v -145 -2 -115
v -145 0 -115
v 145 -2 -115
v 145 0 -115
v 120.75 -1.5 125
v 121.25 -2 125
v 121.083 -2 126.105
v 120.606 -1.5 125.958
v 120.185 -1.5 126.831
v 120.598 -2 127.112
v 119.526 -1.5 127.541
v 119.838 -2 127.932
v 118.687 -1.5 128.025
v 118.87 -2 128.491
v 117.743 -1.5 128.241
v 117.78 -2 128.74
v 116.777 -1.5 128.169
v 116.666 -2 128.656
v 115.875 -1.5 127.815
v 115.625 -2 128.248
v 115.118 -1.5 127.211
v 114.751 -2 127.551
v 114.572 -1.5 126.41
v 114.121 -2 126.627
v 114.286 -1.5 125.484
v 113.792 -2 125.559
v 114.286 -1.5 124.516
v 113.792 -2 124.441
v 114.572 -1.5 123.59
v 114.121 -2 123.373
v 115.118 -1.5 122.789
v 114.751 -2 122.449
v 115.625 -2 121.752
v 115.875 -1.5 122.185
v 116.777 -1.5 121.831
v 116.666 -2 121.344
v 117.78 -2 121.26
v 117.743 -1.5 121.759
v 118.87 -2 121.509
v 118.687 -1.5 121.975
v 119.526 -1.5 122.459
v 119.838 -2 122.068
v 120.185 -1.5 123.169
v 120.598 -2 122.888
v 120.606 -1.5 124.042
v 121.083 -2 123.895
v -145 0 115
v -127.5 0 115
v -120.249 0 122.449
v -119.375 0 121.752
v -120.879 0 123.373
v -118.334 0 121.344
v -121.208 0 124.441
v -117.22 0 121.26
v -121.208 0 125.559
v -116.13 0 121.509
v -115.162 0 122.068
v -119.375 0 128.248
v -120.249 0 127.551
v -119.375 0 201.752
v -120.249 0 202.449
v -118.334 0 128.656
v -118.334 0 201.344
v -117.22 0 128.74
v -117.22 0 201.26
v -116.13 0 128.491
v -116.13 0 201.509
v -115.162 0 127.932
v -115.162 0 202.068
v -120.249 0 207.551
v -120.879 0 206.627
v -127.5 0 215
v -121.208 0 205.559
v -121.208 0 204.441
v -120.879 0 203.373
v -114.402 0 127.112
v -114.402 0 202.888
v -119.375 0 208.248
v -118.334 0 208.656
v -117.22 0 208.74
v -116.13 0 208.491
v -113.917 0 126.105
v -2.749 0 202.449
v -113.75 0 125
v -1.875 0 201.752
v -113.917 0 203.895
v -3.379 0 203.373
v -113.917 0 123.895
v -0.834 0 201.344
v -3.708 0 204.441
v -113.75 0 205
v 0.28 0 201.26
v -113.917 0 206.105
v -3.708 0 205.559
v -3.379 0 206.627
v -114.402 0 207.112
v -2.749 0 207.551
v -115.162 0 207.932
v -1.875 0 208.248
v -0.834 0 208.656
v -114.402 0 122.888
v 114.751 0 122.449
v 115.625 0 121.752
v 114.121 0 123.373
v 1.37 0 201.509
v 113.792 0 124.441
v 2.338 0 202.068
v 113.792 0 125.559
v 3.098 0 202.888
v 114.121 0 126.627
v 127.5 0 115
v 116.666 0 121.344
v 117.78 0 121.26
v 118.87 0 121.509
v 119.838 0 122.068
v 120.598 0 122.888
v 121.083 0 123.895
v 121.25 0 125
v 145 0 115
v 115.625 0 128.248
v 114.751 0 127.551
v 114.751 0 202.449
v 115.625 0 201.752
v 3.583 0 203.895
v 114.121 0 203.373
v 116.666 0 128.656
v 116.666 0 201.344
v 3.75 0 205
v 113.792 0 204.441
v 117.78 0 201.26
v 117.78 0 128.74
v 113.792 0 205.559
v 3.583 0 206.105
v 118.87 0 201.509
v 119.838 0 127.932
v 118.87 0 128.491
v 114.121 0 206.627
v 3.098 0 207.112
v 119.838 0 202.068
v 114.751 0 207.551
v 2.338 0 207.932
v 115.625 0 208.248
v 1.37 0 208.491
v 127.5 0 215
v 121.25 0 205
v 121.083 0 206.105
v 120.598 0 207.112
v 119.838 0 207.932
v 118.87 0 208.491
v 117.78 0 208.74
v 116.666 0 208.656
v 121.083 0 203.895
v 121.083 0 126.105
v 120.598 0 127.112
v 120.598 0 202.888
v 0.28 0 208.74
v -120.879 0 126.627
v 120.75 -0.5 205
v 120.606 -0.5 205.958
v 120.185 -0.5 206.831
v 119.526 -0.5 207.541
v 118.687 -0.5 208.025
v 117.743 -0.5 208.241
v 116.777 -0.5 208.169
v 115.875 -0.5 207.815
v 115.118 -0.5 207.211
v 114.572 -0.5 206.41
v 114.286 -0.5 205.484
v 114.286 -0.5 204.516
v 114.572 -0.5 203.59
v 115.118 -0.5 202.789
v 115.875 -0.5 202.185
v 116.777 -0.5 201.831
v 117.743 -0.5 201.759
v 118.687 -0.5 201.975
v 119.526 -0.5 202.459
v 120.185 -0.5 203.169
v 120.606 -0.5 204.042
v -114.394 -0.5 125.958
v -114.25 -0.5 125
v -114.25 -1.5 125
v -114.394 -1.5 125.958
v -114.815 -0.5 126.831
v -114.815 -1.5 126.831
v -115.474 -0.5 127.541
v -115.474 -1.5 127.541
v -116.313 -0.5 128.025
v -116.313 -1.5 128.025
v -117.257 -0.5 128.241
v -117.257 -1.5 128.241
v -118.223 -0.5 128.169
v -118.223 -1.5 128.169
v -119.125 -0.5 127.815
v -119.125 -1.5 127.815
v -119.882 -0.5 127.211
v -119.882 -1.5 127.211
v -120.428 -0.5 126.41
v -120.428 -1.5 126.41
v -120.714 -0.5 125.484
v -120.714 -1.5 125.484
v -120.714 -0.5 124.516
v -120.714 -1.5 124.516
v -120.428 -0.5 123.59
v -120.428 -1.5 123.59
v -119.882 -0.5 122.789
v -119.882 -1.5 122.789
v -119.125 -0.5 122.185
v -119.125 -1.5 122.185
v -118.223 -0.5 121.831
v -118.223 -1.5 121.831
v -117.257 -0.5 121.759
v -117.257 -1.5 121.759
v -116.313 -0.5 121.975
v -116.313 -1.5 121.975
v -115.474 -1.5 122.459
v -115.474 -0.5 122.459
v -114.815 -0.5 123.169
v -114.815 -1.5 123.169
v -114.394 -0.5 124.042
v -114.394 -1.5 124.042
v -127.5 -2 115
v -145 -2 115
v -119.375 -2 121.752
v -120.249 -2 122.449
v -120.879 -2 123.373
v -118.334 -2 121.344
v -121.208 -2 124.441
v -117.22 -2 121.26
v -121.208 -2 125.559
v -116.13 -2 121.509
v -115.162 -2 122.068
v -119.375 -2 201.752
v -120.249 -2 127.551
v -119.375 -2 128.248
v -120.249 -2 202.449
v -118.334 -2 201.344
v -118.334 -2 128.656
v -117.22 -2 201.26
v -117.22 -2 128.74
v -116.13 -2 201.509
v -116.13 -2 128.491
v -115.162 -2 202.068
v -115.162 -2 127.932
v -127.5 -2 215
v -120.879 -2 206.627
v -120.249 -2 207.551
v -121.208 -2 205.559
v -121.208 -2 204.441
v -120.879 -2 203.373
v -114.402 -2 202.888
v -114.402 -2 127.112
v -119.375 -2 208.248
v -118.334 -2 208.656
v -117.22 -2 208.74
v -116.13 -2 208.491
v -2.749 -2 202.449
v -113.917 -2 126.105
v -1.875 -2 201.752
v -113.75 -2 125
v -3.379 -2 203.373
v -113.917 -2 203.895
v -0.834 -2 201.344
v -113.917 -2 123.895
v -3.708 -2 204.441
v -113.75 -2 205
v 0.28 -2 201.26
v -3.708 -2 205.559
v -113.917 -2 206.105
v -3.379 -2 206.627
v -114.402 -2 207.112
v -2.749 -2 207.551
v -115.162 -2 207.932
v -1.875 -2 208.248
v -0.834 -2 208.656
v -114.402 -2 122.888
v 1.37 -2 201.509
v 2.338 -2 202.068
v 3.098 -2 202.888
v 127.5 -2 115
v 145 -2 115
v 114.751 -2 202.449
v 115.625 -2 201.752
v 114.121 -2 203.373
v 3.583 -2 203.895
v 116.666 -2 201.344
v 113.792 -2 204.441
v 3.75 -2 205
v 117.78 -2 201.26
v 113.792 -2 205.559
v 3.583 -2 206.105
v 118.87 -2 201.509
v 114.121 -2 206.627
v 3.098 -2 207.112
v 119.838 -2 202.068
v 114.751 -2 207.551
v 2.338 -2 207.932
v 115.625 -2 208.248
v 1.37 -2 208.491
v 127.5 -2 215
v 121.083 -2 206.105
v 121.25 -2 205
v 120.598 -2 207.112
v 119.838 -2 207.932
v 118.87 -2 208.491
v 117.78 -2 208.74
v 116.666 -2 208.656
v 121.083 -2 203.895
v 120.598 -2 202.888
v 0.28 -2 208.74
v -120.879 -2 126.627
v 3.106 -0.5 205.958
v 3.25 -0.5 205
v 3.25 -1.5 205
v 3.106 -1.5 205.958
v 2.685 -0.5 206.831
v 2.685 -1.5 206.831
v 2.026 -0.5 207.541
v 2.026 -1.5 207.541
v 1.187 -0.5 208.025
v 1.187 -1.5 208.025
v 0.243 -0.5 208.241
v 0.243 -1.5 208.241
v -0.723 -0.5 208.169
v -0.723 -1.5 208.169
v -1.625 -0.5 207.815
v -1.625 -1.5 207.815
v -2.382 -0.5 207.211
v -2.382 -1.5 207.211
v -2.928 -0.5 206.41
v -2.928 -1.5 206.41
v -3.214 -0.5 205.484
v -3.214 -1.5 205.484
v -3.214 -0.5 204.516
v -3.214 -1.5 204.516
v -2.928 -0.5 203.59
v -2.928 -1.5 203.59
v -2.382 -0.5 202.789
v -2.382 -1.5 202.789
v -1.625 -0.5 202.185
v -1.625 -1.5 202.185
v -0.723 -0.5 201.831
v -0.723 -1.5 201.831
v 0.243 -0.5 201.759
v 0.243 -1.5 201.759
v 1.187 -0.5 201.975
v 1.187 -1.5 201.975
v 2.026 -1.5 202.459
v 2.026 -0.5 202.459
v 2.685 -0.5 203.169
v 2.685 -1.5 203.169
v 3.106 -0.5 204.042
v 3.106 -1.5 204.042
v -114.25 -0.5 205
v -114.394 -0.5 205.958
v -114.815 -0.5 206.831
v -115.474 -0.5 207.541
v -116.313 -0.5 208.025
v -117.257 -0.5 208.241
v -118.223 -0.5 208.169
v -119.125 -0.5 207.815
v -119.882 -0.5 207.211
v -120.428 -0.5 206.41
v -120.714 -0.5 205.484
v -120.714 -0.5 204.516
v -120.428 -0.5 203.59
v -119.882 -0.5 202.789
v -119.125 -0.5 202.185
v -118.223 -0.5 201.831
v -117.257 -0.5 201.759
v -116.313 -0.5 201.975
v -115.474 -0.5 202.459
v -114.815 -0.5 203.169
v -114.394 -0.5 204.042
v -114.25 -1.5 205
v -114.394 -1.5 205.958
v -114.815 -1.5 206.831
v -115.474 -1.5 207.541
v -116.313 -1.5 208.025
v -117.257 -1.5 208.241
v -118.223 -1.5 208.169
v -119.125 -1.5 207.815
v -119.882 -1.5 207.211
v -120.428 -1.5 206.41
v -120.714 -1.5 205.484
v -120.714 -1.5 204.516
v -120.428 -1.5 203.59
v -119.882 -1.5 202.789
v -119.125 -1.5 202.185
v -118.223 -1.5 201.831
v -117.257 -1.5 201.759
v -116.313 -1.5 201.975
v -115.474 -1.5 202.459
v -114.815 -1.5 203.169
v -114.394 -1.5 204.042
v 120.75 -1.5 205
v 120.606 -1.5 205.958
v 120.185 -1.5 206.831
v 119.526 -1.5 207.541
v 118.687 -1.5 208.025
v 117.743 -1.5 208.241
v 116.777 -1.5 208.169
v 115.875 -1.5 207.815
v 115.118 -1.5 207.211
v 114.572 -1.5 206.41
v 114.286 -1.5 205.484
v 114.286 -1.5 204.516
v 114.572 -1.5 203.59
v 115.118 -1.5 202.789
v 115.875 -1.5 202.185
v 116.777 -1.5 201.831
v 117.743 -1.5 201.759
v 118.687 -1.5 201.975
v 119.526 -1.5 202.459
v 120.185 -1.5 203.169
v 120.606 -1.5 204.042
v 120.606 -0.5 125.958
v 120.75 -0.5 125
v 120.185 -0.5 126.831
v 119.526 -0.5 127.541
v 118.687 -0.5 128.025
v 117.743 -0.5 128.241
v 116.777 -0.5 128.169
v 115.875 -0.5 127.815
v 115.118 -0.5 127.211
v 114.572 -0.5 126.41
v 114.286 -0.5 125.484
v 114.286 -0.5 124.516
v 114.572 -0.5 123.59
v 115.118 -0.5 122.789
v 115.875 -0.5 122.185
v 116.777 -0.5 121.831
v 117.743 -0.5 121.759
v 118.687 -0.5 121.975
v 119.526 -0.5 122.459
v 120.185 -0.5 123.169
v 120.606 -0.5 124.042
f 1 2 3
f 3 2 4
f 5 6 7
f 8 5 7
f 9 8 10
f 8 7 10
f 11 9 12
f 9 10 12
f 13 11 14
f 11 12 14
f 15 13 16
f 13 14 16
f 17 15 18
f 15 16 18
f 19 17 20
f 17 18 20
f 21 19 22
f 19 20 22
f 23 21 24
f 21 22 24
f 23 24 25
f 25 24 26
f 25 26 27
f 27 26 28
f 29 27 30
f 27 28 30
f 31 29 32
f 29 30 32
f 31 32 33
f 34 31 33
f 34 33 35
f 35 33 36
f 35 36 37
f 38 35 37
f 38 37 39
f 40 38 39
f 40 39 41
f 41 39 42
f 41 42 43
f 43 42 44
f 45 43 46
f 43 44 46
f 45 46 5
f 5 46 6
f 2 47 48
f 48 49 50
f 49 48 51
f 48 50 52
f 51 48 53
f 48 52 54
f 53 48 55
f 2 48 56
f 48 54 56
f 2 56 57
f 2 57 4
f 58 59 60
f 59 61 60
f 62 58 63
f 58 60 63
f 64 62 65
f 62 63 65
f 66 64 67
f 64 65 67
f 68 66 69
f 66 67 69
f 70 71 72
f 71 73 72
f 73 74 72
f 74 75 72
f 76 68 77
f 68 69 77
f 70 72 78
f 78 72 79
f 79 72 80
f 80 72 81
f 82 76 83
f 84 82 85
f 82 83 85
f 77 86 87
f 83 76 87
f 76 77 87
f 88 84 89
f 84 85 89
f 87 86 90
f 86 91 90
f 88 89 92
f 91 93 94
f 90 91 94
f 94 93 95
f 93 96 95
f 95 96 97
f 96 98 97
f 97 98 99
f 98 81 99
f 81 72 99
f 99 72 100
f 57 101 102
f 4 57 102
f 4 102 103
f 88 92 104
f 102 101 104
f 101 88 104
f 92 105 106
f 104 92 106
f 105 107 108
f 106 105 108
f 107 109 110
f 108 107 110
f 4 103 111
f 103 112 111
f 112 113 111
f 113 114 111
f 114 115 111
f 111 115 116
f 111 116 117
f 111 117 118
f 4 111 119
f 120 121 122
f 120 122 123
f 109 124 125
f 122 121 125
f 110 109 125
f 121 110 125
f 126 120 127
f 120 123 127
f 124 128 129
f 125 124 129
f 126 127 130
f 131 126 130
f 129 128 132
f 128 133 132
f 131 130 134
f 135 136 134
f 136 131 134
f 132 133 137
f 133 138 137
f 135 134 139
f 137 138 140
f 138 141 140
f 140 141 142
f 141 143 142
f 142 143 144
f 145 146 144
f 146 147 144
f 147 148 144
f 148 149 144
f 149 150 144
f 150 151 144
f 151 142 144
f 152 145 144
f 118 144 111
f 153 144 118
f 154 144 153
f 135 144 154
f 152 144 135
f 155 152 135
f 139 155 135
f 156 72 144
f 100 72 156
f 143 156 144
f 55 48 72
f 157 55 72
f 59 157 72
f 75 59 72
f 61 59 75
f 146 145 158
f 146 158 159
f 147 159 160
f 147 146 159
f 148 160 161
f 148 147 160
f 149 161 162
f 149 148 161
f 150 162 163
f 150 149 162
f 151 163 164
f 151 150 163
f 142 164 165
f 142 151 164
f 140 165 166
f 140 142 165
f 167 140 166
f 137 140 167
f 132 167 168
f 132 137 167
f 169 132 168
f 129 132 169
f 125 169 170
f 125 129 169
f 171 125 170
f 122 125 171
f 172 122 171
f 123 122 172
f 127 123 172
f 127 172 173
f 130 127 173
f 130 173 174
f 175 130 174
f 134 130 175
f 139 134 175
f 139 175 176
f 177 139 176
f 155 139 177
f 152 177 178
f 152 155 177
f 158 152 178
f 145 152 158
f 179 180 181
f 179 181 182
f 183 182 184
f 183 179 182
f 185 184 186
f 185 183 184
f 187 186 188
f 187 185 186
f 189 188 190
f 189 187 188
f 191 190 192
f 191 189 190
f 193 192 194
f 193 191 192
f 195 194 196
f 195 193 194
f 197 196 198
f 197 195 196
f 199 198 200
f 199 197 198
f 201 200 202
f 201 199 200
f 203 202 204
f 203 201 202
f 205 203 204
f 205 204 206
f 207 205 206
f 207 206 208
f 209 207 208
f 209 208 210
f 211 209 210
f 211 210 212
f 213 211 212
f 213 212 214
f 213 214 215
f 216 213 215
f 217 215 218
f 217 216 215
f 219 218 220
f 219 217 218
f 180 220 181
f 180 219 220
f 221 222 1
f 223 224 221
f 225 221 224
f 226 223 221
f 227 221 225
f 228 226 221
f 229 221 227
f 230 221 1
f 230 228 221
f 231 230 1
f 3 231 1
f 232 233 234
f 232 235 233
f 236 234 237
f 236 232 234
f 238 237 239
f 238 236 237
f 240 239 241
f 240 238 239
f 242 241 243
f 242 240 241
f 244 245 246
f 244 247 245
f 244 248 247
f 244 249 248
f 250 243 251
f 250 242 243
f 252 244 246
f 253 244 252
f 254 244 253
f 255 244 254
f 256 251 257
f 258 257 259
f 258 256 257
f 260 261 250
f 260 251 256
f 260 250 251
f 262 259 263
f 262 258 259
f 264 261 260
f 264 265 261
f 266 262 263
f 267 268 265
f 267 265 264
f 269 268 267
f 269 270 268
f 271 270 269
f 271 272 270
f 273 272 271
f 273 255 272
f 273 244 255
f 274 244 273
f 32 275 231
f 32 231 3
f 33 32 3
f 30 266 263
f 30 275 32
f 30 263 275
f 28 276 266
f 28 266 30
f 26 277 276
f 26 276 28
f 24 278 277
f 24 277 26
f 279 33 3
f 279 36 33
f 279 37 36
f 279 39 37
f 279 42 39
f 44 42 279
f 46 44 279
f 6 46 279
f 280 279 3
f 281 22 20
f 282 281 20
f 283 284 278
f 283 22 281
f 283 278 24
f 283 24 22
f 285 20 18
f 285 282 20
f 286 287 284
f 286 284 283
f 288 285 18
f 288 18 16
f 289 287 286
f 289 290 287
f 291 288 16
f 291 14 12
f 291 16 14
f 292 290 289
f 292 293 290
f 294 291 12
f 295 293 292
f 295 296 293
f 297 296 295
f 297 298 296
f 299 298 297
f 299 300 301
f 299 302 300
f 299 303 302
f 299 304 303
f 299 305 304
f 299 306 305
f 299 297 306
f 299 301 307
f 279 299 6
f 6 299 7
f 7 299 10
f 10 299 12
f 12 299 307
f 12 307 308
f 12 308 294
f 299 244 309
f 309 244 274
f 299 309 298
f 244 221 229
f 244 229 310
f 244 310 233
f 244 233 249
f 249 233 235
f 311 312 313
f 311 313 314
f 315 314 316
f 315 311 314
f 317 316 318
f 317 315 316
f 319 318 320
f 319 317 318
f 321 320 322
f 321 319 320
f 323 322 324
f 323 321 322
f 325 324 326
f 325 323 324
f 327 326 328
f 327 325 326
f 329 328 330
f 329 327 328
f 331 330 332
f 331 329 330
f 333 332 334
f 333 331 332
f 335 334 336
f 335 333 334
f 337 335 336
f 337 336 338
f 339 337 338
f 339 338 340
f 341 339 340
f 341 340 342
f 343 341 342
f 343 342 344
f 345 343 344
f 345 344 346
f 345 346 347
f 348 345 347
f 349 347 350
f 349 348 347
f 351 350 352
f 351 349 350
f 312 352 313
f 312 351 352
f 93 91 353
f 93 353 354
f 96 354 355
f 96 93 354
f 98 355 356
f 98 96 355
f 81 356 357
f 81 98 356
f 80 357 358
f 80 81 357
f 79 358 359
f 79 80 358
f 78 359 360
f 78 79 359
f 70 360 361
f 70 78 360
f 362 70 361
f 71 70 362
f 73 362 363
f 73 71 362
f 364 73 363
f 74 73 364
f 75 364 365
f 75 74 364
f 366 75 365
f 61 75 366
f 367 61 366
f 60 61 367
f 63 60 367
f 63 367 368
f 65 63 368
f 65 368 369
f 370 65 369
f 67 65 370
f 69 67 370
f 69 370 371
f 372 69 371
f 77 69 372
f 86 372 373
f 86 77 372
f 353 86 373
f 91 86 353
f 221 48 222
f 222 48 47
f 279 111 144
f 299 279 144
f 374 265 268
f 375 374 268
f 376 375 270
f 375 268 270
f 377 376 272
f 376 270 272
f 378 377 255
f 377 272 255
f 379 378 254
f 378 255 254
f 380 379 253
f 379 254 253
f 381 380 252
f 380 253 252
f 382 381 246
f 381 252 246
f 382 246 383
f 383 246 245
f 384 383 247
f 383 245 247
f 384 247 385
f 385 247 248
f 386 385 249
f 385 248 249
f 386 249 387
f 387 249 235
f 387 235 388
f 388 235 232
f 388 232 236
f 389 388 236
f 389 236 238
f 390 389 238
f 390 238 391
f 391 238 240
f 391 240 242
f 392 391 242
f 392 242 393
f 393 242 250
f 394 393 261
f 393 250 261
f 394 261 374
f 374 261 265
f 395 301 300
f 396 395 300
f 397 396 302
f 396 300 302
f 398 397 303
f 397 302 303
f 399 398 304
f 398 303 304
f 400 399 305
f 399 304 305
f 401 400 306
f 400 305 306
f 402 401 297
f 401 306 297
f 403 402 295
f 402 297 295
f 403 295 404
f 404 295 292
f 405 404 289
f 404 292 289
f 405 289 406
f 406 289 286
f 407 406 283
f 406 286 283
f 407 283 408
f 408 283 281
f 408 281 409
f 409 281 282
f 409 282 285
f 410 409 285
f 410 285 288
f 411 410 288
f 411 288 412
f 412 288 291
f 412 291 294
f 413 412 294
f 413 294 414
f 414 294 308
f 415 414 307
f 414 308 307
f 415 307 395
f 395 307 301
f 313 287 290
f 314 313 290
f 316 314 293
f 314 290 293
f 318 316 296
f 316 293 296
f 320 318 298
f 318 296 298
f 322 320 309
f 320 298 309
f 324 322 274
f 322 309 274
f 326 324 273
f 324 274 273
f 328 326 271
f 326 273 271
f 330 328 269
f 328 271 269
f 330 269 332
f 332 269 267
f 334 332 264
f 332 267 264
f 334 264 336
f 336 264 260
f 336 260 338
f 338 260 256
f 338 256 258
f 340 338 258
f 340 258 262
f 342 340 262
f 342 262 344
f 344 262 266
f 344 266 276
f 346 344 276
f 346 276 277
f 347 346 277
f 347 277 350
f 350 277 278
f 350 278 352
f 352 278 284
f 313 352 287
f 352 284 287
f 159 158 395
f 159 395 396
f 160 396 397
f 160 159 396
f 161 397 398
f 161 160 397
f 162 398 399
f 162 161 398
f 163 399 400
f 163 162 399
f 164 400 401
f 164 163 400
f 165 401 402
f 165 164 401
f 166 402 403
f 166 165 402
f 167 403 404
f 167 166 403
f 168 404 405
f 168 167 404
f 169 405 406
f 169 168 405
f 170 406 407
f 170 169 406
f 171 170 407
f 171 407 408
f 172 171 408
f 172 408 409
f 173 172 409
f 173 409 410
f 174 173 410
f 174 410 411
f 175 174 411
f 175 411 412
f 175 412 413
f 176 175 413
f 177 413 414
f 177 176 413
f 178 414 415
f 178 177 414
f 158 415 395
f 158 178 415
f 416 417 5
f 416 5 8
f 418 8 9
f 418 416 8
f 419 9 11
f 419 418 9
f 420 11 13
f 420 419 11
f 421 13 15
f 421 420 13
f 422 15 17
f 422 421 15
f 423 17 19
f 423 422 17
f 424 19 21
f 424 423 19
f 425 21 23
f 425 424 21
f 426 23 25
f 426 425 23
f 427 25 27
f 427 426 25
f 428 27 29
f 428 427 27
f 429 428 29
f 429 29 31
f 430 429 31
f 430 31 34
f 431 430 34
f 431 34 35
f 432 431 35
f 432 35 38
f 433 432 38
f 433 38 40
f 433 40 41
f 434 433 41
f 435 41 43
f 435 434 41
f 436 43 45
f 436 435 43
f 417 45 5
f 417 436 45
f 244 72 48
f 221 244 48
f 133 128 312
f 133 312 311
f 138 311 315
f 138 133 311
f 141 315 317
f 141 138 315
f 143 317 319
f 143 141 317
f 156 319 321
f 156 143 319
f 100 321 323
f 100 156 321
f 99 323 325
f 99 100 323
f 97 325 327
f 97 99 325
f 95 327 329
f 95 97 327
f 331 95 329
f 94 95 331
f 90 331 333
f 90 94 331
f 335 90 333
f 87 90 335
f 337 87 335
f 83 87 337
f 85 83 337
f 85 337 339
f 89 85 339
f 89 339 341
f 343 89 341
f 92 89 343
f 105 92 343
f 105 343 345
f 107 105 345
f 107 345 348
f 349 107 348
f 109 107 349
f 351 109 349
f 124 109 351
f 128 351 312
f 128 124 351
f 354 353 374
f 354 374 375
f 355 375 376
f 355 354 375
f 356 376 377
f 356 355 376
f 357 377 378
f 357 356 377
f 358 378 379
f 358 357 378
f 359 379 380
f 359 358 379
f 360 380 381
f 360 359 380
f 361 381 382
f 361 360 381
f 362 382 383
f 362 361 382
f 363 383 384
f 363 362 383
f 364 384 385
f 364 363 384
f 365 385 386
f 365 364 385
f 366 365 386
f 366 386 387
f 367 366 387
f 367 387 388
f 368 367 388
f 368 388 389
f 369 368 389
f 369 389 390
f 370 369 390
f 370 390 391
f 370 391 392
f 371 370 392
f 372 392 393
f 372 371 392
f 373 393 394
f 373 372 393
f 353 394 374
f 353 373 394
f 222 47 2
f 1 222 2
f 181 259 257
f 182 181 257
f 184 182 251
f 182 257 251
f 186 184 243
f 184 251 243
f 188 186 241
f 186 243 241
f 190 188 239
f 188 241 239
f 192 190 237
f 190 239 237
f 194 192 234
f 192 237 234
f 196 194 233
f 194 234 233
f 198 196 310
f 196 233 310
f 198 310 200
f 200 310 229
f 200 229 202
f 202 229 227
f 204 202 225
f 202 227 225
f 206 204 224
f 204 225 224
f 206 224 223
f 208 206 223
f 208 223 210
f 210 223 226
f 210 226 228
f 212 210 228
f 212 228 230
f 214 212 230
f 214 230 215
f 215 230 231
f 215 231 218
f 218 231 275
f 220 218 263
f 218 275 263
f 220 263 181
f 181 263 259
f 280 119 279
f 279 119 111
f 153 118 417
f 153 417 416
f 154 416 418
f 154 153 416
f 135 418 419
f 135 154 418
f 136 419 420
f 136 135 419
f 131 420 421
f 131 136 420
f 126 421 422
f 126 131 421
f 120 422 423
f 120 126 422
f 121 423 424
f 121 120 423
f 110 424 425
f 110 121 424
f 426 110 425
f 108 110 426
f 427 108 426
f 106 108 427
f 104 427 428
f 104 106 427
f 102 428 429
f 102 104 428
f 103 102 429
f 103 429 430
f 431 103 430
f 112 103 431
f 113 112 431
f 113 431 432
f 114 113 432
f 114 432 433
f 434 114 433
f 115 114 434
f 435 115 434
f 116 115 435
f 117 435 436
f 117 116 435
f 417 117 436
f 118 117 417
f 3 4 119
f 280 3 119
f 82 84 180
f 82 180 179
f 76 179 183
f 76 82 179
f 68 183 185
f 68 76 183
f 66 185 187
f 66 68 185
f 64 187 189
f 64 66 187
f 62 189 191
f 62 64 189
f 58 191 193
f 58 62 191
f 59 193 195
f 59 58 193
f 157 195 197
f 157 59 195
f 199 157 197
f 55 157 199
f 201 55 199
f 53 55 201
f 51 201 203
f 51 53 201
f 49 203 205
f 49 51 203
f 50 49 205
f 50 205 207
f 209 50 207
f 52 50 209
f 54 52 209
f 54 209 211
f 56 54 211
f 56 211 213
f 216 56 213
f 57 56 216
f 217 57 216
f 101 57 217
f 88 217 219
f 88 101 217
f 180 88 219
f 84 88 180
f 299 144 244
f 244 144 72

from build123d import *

# Parameters (mm, degrees)
F0_R     = 3.25
F1_DEPTH = 2
F2_SIZE  = 0.5


with BuildPart() as f1:
    # F0 (on Front) → F1 (new body)
    with BuildSketch(Plane.XZ):
        Polygon((145, -115), (145, 115), (127.5, 115), (127.5, 215), (-127.5, 215), (-127.5, 115), (-145, 115), (-145, -115), align=None)
        with Locations((-117.5, 125)):
            Circle(F0_R, mode=Mode.SUBTRACT)
        with Locations((-117.5, 205)):
            Circle(F0_R, mode=Mode.SUBTRACT)
        with Locations((117.5, 125)):
            Circle(F0_R, mode=Mode.SUBTRACT)
        with Locations((0, 205)):
            Circle(F0_R, mode=Mode.SUBTRACT)
        with Locations((117.5, 205)):
            Circle(F0_R, mode=Mode.SUBTRACT)
    extrude(amount=F1_DEPTH)

    # F2
    f2_edges = [f1.edges().sort_by_distance(p)[0] for p in [
        (-114.25, -1, 125),
        (-120.75, 0, 125),
        (-120.75, -2, 125),
        (-114.25, -1, 205),
        (-120.75, 0, 205),
        (-120.75, -2, 205),
        (120.75, -1, 205),
        (114.25, 0, 205),
        (114.25, -2, 205),
        (120.75, -1, 125),
        (114.25, 0, 125),
        (114.25, -2, 125),
        (3.25, -1, 205),
        (-3.25, 0, 205),
        (-3.25, -2, 205),
    ]]
    chamfer(f2_edges, length=F2_SIZE)


solid = f1.part
